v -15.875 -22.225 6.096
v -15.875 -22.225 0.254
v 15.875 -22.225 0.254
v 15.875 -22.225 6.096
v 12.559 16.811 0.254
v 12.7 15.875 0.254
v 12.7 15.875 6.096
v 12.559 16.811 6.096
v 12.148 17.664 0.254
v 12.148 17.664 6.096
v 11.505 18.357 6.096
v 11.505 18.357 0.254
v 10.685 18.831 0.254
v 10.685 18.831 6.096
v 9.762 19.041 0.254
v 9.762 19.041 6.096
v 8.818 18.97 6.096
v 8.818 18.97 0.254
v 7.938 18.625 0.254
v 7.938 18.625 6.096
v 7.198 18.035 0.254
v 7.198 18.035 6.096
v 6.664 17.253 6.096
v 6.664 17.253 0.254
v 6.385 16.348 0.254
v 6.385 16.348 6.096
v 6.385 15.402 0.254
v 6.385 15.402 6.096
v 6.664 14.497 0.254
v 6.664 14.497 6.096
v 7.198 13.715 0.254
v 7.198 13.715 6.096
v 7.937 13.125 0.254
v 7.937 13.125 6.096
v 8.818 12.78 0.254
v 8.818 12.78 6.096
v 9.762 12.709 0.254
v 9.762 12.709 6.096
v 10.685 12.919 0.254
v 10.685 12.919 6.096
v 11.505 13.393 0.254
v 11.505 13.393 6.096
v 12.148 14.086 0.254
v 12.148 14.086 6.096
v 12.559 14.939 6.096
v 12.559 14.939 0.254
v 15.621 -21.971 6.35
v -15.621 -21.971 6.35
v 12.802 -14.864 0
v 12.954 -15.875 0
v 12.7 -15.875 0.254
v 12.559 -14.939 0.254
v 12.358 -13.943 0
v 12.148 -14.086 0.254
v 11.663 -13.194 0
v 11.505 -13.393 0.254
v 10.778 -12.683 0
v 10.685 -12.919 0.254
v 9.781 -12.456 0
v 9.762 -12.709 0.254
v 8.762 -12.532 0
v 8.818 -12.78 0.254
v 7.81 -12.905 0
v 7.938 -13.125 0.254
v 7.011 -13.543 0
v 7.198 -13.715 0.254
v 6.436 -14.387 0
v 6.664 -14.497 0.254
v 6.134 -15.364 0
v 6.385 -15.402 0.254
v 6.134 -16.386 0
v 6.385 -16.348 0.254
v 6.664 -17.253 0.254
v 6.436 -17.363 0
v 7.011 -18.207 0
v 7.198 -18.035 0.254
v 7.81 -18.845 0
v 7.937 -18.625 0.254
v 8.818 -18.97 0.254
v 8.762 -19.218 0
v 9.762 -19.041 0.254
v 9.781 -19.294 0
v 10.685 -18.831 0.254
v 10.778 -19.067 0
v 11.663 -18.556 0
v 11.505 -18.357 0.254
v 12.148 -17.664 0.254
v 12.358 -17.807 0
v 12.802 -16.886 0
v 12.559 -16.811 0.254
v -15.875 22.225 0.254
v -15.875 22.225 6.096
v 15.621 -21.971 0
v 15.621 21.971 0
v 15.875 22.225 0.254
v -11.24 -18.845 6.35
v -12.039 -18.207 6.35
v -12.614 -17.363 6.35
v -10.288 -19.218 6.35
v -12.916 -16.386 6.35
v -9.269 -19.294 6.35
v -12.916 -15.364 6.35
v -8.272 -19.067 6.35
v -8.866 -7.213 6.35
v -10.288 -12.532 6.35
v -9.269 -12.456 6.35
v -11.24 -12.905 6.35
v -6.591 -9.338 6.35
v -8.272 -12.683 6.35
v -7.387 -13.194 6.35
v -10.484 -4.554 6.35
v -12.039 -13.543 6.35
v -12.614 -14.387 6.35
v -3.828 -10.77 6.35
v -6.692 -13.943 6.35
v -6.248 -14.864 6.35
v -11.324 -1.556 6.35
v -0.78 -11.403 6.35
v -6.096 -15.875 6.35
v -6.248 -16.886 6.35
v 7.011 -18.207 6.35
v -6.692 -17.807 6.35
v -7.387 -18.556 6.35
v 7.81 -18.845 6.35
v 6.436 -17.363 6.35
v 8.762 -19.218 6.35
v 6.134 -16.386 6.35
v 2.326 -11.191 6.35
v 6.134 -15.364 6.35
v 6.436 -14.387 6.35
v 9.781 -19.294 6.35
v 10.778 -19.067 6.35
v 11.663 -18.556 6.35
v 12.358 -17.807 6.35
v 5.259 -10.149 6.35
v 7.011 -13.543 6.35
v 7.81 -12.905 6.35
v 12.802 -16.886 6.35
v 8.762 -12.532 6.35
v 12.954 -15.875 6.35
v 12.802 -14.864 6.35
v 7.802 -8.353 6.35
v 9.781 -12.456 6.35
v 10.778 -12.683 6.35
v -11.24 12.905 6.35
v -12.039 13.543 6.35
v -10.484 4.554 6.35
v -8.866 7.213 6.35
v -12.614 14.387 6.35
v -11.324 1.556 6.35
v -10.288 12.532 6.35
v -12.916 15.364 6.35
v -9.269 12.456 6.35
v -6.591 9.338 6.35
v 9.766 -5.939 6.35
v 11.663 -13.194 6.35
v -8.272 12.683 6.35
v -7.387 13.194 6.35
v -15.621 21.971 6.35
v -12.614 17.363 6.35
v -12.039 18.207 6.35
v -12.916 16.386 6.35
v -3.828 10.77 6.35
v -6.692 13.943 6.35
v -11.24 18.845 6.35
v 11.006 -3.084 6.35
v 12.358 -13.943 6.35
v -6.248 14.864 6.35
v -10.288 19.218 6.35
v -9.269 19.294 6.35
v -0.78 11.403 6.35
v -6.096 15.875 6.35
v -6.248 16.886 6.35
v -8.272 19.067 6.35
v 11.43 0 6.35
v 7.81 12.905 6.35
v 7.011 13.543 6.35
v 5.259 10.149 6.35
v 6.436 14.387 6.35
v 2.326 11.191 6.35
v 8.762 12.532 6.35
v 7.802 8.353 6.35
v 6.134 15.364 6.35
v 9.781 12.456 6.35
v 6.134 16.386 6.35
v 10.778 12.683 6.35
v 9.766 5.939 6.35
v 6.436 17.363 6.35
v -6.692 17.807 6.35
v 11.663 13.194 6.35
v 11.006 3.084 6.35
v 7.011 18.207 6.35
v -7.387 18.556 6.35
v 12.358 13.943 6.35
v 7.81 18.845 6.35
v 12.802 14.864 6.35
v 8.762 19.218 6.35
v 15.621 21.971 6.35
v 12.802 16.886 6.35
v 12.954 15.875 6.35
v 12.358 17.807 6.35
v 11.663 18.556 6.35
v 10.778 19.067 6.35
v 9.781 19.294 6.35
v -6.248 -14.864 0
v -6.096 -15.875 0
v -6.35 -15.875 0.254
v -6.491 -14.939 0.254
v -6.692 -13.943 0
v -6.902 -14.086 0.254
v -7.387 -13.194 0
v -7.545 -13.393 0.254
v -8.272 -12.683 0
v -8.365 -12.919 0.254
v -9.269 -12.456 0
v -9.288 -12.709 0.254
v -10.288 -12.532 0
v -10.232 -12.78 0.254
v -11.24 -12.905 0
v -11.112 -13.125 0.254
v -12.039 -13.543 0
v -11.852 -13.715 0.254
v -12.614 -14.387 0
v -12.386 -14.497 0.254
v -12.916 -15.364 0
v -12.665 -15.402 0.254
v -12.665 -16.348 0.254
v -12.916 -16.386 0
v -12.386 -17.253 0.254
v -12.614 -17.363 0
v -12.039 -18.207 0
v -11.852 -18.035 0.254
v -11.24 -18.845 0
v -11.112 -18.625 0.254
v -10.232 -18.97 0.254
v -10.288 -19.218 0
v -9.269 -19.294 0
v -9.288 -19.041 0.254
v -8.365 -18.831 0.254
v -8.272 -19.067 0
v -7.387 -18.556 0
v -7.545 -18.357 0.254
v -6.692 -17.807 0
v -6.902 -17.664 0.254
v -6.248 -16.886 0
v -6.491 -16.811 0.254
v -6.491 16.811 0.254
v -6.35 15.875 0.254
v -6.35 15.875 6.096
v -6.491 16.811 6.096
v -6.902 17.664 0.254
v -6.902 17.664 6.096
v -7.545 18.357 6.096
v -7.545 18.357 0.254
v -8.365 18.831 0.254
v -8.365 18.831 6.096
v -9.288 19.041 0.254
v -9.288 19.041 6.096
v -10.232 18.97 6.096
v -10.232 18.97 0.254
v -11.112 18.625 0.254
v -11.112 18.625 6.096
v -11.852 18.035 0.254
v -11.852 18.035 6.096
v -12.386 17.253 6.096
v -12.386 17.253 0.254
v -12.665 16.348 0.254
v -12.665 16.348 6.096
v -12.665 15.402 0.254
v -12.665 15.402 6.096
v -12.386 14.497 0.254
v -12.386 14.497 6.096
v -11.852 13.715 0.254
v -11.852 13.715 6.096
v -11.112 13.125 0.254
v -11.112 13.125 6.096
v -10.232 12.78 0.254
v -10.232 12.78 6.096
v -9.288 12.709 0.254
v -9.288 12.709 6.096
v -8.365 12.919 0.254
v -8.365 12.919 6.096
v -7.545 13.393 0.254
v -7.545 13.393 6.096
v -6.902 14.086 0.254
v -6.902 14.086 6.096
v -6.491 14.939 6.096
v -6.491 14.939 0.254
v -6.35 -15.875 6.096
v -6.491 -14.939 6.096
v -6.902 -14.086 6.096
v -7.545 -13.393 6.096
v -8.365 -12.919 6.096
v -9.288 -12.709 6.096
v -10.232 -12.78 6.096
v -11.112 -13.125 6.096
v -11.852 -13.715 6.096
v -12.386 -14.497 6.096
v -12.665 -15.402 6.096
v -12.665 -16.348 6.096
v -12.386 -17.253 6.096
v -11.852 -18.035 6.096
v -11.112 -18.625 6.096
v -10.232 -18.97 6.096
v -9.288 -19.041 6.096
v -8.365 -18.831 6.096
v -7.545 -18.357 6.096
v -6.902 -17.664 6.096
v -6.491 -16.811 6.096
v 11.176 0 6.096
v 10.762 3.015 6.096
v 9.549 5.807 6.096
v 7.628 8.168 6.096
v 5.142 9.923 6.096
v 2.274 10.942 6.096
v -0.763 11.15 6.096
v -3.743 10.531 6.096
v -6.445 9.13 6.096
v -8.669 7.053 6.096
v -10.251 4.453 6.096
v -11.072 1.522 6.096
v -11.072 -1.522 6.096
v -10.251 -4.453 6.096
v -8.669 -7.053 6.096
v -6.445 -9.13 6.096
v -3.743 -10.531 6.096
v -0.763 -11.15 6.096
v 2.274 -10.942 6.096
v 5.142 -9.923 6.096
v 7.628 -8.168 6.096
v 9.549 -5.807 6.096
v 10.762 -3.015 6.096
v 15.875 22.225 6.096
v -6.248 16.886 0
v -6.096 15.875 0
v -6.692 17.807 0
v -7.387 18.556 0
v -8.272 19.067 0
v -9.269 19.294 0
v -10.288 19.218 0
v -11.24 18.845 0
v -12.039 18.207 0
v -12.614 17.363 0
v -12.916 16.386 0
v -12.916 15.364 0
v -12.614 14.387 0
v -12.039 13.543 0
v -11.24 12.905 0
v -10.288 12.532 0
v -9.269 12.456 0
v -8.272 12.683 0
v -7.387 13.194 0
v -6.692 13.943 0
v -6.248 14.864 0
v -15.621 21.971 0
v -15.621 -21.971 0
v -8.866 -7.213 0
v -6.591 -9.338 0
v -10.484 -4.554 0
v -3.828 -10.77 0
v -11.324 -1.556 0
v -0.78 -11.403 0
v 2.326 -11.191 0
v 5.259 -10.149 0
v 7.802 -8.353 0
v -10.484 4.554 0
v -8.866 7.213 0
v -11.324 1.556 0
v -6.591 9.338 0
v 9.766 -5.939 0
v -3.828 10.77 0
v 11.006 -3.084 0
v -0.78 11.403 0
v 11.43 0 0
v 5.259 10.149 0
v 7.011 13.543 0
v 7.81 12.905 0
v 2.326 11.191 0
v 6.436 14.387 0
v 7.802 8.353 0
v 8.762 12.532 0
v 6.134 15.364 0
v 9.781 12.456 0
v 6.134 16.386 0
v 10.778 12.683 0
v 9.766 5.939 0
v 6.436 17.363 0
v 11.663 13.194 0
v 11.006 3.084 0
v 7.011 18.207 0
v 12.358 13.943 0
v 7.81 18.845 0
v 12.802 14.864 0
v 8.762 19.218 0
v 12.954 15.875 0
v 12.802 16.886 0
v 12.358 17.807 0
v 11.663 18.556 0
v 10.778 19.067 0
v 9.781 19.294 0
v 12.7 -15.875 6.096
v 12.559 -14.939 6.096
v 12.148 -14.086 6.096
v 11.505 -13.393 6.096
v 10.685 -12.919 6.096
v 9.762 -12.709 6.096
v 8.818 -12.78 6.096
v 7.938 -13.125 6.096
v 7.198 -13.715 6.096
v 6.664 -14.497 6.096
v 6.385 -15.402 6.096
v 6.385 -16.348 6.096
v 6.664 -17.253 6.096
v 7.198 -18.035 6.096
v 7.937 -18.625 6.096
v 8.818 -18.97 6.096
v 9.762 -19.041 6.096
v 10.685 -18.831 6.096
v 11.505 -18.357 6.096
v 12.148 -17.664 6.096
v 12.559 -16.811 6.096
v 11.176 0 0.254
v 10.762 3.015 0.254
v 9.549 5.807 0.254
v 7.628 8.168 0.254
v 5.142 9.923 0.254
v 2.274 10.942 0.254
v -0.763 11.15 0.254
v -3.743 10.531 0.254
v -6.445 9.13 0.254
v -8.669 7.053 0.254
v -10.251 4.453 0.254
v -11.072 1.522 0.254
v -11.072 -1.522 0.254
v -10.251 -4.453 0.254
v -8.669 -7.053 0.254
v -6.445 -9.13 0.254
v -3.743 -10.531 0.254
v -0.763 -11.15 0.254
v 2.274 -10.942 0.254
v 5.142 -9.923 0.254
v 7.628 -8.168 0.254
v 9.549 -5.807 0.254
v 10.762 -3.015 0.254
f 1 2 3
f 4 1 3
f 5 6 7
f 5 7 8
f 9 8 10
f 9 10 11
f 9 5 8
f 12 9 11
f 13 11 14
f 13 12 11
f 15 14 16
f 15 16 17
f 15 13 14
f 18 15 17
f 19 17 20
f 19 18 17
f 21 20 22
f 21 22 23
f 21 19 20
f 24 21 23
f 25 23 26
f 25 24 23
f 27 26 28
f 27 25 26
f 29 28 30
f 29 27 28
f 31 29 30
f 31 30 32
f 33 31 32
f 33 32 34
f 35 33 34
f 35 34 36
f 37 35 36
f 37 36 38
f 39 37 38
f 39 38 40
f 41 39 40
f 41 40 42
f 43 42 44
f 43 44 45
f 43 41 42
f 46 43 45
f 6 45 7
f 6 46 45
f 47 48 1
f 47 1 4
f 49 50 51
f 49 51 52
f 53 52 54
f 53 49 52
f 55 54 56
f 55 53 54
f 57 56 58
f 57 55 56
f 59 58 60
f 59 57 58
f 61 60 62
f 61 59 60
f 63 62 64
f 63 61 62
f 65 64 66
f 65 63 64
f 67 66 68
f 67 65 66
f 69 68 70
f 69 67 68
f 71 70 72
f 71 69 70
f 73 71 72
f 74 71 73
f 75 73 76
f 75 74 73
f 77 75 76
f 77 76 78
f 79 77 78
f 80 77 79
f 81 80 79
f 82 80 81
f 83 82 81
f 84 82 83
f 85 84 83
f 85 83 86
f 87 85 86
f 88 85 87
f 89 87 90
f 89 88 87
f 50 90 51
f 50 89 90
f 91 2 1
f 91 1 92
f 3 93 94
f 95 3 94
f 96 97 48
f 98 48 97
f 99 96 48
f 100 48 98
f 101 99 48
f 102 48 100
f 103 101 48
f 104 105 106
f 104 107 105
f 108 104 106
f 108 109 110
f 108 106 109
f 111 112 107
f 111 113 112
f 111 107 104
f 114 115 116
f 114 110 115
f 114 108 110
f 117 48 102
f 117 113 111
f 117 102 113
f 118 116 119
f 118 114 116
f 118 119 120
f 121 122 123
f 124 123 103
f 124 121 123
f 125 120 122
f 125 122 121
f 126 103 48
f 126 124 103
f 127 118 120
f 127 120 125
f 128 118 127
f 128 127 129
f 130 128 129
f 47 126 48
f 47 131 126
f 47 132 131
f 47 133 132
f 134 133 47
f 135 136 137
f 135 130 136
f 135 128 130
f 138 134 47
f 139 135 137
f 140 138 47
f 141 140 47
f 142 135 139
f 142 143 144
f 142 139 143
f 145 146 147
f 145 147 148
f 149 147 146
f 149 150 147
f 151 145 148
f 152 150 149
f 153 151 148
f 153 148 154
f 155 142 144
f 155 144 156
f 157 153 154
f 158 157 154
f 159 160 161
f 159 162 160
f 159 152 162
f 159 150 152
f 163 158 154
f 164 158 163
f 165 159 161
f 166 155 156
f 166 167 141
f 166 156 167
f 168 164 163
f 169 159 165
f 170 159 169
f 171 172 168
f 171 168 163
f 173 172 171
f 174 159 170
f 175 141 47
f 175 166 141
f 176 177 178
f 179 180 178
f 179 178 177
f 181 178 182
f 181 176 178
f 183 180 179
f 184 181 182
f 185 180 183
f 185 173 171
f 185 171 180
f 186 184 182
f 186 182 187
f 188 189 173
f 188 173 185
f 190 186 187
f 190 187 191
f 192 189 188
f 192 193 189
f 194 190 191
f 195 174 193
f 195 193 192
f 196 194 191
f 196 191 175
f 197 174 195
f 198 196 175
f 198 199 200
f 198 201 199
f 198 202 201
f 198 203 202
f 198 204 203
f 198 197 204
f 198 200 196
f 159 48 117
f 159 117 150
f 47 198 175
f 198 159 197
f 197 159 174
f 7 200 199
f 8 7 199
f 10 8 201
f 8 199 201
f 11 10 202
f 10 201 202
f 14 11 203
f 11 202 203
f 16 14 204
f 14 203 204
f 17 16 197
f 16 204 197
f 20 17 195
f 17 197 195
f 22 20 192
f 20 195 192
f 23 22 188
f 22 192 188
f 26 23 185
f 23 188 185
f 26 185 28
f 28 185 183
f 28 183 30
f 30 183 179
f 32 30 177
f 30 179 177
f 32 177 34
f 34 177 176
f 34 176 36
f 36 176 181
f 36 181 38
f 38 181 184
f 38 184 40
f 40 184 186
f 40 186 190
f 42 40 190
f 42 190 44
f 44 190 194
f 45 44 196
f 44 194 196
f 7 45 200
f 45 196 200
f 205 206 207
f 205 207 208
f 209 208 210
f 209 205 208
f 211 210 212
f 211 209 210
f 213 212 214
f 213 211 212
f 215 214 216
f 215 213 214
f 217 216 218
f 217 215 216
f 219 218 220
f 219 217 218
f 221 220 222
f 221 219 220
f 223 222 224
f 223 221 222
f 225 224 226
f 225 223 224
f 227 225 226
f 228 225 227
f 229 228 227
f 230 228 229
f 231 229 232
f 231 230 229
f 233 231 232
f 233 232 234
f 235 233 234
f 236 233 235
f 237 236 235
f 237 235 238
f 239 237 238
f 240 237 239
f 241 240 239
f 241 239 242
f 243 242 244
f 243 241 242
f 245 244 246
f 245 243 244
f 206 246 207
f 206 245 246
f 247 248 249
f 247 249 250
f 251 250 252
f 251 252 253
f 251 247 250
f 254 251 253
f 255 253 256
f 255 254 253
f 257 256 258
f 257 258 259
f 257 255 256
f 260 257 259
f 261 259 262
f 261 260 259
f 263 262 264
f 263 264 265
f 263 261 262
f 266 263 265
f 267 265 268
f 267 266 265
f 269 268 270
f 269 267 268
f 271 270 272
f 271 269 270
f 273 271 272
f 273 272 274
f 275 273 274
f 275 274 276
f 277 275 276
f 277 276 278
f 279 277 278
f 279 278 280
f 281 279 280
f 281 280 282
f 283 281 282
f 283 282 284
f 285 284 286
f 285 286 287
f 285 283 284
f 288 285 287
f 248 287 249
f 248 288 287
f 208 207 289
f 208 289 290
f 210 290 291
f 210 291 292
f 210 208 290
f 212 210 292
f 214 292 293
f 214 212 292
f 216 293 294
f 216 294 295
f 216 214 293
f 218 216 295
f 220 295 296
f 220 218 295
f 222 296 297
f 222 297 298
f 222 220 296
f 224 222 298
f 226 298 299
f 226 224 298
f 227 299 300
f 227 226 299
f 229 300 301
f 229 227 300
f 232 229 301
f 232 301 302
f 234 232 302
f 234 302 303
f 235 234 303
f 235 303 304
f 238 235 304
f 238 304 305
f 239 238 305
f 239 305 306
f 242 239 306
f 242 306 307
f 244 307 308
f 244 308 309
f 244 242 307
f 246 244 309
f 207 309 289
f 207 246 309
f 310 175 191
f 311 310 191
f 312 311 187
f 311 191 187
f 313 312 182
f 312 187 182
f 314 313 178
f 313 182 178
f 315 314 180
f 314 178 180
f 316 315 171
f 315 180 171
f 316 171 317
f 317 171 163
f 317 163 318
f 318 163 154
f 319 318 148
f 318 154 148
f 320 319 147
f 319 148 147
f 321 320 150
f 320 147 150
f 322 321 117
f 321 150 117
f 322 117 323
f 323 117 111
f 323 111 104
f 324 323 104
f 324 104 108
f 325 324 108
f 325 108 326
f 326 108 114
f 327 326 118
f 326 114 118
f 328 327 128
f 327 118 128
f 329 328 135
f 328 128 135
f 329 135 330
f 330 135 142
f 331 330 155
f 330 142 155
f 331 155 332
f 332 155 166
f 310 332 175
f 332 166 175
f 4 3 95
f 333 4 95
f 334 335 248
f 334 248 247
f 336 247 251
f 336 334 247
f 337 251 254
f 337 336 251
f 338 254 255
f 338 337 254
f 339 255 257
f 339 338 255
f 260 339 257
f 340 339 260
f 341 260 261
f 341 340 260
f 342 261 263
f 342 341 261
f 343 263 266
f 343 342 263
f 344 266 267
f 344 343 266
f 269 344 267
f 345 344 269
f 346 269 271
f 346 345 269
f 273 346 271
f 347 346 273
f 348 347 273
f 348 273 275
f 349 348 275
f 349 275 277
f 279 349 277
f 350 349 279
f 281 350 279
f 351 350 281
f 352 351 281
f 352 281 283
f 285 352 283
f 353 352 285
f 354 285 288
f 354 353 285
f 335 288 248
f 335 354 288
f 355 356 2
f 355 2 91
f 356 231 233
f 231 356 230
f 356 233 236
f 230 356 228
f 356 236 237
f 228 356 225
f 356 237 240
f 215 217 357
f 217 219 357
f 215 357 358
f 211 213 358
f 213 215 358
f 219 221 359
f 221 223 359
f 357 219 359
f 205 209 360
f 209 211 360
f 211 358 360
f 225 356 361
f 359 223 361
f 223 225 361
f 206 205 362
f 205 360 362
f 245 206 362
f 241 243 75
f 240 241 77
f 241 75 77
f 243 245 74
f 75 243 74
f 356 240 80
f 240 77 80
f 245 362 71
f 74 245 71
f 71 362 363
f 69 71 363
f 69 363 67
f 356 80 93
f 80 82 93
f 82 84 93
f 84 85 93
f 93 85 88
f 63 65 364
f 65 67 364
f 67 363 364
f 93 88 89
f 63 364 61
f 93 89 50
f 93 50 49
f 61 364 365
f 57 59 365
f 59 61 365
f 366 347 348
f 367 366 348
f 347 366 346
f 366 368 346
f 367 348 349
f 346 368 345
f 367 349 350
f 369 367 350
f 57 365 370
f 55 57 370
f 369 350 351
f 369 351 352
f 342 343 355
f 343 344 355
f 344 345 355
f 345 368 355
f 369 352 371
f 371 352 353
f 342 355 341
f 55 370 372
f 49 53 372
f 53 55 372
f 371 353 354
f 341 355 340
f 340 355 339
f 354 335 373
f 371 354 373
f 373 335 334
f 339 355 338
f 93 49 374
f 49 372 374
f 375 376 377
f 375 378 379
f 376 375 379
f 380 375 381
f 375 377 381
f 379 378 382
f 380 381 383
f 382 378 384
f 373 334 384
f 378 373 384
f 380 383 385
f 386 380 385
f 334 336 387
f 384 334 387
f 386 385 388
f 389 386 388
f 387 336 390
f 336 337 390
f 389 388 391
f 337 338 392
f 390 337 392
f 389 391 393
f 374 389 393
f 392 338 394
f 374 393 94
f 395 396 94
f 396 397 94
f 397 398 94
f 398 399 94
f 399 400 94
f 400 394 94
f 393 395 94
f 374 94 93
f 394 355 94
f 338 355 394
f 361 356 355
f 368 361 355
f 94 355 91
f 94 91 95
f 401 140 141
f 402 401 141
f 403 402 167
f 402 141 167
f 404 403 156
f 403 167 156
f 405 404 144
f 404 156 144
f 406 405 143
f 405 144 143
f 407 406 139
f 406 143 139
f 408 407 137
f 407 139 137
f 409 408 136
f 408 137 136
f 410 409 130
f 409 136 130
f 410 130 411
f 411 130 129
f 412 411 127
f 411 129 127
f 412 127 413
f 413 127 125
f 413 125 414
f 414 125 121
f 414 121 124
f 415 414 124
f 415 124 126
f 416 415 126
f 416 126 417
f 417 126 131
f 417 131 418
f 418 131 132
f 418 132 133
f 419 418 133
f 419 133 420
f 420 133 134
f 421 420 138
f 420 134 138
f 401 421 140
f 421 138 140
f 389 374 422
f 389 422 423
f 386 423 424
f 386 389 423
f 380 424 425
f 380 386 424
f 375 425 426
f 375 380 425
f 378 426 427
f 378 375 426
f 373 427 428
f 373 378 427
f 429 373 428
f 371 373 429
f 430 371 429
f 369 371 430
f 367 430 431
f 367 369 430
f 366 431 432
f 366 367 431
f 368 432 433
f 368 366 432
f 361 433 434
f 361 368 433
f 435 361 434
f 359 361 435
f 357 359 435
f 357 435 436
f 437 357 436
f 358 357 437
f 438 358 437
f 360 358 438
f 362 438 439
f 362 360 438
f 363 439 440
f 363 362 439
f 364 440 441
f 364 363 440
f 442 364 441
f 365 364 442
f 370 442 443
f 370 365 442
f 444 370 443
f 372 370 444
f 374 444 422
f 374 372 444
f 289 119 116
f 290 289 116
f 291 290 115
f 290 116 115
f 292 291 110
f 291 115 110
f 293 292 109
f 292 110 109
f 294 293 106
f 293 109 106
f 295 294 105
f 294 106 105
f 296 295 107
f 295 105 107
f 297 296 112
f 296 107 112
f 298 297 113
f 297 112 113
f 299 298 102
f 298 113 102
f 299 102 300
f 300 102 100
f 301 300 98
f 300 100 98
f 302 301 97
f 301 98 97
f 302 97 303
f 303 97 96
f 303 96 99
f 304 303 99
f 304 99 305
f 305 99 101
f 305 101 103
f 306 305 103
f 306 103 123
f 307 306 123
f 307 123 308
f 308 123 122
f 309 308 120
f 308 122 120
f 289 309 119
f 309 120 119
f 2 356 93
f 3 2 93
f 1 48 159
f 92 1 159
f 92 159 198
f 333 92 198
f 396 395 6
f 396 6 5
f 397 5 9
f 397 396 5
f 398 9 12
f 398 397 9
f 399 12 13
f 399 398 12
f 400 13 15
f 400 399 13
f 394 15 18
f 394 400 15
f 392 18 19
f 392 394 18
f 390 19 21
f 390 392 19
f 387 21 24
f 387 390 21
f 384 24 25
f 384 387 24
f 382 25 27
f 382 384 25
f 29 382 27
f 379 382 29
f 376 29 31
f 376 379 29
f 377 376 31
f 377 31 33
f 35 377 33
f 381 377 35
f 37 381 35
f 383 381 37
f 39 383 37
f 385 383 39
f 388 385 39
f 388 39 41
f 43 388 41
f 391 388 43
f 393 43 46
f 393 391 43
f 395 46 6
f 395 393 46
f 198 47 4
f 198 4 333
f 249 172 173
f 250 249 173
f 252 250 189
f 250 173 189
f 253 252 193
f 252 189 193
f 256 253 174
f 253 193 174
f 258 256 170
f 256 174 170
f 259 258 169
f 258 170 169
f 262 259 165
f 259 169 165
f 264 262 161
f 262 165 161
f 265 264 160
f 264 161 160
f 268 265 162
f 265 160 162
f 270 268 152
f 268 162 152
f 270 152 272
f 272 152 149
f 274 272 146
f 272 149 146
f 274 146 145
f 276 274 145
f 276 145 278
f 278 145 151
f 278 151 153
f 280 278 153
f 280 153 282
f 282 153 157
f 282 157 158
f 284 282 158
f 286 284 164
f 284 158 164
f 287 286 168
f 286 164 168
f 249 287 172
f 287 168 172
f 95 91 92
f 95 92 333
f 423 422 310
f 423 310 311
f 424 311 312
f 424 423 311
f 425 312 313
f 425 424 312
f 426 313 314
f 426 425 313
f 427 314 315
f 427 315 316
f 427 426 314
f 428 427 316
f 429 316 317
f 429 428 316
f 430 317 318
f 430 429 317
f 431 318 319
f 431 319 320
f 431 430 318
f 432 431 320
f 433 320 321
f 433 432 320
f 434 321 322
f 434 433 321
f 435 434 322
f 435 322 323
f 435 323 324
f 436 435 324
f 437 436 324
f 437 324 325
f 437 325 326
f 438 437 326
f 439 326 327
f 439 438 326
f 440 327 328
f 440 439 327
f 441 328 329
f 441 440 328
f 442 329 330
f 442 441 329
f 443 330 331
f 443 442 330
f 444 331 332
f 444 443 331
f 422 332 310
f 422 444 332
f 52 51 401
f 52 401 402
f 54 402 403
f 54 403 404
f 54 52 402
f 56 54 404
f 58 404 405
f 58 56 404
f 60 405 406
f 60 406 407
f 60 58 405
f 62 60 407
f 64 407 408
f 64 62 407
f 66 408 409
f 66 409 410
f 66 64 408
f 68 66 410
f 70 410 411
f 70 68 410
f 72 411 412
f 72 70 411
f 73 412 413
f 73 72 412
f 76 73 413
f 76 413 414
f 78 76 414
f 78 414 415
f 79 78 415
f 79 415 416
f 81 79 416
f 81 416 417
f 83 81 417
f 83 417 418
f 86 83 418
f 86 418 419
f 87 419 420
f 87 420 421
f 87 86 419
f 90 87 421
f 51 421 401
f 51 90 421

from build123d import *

# Parameters (mm, degrees)
SKETCH1_W           = 31.75
SKETCH1_H           = 44.45
SKETCH1_R           = 3.175
SKETCH1_R_2         = 11.176
BOSS_EXTRUDE1_DEPTH = 6.35
CHAMFER1_SIZE       = 0.254


with BuildPart() as part:
    # Sketch1 → Boss-Extrude1 (new body)
    with BuildSketch(Plane.XY):
        Rectangle(SKETCH1_W, SKETCH1_H)
        with Locations((-9.525, 15.875)):
            Circle(SKETCH1_R, mode=Mode.SUBTRACT)
        with Locations((9.525, 15.875)):
            Circle(SKETCH1_R, mode=Mode.SUBTRACT)
        with Locations((-9.525, -15.875)):
            Circle(SKETCH1_R, mode=Mode.SUBTRACT)
        with Locations((9.525, -15.875)):
            Circle(SKETCH1_R, mode=Mode.SUBTRACT)
        Circle(SKETCH1_R_2, mode=Mode.SUBTRACT)
    extrude(amount=BOSS_EXTRUDE1_DEPTH)

    # Chamfer1
    chamfer1_edges = [part.edges().sort_by_distance(p)[0] for p in [
        (-15.875, 0, 6.35),
        (-12.7, 15.875, 0),
        (-12.7, 15.875, 6.35),
        (0, -22.225, 6.35),
        (6.35, 15.875, 0),
        (6.35, 15.875, 6.35),
        (-12.7, -15.875, 0),
        (-12.7, -15.875, 6.35),
        (6.35, -15.875, 0),
        (6.35, -15.875, 6.35),
        (-11.176, 0, 0),
        (-11.176, 0, 6.35),
        (15.875, 0, 6.35),
        (0, -22.225, 0),
        (-15.875, 0, 0),
        (0, 22.225, 0),
        (15.875, 0, 0),
        (0, 22.225, 6.35),
    ]]
    chamfer(chamfer1_edges, length=CHAMFER1_SIZE)


solid = part.part
